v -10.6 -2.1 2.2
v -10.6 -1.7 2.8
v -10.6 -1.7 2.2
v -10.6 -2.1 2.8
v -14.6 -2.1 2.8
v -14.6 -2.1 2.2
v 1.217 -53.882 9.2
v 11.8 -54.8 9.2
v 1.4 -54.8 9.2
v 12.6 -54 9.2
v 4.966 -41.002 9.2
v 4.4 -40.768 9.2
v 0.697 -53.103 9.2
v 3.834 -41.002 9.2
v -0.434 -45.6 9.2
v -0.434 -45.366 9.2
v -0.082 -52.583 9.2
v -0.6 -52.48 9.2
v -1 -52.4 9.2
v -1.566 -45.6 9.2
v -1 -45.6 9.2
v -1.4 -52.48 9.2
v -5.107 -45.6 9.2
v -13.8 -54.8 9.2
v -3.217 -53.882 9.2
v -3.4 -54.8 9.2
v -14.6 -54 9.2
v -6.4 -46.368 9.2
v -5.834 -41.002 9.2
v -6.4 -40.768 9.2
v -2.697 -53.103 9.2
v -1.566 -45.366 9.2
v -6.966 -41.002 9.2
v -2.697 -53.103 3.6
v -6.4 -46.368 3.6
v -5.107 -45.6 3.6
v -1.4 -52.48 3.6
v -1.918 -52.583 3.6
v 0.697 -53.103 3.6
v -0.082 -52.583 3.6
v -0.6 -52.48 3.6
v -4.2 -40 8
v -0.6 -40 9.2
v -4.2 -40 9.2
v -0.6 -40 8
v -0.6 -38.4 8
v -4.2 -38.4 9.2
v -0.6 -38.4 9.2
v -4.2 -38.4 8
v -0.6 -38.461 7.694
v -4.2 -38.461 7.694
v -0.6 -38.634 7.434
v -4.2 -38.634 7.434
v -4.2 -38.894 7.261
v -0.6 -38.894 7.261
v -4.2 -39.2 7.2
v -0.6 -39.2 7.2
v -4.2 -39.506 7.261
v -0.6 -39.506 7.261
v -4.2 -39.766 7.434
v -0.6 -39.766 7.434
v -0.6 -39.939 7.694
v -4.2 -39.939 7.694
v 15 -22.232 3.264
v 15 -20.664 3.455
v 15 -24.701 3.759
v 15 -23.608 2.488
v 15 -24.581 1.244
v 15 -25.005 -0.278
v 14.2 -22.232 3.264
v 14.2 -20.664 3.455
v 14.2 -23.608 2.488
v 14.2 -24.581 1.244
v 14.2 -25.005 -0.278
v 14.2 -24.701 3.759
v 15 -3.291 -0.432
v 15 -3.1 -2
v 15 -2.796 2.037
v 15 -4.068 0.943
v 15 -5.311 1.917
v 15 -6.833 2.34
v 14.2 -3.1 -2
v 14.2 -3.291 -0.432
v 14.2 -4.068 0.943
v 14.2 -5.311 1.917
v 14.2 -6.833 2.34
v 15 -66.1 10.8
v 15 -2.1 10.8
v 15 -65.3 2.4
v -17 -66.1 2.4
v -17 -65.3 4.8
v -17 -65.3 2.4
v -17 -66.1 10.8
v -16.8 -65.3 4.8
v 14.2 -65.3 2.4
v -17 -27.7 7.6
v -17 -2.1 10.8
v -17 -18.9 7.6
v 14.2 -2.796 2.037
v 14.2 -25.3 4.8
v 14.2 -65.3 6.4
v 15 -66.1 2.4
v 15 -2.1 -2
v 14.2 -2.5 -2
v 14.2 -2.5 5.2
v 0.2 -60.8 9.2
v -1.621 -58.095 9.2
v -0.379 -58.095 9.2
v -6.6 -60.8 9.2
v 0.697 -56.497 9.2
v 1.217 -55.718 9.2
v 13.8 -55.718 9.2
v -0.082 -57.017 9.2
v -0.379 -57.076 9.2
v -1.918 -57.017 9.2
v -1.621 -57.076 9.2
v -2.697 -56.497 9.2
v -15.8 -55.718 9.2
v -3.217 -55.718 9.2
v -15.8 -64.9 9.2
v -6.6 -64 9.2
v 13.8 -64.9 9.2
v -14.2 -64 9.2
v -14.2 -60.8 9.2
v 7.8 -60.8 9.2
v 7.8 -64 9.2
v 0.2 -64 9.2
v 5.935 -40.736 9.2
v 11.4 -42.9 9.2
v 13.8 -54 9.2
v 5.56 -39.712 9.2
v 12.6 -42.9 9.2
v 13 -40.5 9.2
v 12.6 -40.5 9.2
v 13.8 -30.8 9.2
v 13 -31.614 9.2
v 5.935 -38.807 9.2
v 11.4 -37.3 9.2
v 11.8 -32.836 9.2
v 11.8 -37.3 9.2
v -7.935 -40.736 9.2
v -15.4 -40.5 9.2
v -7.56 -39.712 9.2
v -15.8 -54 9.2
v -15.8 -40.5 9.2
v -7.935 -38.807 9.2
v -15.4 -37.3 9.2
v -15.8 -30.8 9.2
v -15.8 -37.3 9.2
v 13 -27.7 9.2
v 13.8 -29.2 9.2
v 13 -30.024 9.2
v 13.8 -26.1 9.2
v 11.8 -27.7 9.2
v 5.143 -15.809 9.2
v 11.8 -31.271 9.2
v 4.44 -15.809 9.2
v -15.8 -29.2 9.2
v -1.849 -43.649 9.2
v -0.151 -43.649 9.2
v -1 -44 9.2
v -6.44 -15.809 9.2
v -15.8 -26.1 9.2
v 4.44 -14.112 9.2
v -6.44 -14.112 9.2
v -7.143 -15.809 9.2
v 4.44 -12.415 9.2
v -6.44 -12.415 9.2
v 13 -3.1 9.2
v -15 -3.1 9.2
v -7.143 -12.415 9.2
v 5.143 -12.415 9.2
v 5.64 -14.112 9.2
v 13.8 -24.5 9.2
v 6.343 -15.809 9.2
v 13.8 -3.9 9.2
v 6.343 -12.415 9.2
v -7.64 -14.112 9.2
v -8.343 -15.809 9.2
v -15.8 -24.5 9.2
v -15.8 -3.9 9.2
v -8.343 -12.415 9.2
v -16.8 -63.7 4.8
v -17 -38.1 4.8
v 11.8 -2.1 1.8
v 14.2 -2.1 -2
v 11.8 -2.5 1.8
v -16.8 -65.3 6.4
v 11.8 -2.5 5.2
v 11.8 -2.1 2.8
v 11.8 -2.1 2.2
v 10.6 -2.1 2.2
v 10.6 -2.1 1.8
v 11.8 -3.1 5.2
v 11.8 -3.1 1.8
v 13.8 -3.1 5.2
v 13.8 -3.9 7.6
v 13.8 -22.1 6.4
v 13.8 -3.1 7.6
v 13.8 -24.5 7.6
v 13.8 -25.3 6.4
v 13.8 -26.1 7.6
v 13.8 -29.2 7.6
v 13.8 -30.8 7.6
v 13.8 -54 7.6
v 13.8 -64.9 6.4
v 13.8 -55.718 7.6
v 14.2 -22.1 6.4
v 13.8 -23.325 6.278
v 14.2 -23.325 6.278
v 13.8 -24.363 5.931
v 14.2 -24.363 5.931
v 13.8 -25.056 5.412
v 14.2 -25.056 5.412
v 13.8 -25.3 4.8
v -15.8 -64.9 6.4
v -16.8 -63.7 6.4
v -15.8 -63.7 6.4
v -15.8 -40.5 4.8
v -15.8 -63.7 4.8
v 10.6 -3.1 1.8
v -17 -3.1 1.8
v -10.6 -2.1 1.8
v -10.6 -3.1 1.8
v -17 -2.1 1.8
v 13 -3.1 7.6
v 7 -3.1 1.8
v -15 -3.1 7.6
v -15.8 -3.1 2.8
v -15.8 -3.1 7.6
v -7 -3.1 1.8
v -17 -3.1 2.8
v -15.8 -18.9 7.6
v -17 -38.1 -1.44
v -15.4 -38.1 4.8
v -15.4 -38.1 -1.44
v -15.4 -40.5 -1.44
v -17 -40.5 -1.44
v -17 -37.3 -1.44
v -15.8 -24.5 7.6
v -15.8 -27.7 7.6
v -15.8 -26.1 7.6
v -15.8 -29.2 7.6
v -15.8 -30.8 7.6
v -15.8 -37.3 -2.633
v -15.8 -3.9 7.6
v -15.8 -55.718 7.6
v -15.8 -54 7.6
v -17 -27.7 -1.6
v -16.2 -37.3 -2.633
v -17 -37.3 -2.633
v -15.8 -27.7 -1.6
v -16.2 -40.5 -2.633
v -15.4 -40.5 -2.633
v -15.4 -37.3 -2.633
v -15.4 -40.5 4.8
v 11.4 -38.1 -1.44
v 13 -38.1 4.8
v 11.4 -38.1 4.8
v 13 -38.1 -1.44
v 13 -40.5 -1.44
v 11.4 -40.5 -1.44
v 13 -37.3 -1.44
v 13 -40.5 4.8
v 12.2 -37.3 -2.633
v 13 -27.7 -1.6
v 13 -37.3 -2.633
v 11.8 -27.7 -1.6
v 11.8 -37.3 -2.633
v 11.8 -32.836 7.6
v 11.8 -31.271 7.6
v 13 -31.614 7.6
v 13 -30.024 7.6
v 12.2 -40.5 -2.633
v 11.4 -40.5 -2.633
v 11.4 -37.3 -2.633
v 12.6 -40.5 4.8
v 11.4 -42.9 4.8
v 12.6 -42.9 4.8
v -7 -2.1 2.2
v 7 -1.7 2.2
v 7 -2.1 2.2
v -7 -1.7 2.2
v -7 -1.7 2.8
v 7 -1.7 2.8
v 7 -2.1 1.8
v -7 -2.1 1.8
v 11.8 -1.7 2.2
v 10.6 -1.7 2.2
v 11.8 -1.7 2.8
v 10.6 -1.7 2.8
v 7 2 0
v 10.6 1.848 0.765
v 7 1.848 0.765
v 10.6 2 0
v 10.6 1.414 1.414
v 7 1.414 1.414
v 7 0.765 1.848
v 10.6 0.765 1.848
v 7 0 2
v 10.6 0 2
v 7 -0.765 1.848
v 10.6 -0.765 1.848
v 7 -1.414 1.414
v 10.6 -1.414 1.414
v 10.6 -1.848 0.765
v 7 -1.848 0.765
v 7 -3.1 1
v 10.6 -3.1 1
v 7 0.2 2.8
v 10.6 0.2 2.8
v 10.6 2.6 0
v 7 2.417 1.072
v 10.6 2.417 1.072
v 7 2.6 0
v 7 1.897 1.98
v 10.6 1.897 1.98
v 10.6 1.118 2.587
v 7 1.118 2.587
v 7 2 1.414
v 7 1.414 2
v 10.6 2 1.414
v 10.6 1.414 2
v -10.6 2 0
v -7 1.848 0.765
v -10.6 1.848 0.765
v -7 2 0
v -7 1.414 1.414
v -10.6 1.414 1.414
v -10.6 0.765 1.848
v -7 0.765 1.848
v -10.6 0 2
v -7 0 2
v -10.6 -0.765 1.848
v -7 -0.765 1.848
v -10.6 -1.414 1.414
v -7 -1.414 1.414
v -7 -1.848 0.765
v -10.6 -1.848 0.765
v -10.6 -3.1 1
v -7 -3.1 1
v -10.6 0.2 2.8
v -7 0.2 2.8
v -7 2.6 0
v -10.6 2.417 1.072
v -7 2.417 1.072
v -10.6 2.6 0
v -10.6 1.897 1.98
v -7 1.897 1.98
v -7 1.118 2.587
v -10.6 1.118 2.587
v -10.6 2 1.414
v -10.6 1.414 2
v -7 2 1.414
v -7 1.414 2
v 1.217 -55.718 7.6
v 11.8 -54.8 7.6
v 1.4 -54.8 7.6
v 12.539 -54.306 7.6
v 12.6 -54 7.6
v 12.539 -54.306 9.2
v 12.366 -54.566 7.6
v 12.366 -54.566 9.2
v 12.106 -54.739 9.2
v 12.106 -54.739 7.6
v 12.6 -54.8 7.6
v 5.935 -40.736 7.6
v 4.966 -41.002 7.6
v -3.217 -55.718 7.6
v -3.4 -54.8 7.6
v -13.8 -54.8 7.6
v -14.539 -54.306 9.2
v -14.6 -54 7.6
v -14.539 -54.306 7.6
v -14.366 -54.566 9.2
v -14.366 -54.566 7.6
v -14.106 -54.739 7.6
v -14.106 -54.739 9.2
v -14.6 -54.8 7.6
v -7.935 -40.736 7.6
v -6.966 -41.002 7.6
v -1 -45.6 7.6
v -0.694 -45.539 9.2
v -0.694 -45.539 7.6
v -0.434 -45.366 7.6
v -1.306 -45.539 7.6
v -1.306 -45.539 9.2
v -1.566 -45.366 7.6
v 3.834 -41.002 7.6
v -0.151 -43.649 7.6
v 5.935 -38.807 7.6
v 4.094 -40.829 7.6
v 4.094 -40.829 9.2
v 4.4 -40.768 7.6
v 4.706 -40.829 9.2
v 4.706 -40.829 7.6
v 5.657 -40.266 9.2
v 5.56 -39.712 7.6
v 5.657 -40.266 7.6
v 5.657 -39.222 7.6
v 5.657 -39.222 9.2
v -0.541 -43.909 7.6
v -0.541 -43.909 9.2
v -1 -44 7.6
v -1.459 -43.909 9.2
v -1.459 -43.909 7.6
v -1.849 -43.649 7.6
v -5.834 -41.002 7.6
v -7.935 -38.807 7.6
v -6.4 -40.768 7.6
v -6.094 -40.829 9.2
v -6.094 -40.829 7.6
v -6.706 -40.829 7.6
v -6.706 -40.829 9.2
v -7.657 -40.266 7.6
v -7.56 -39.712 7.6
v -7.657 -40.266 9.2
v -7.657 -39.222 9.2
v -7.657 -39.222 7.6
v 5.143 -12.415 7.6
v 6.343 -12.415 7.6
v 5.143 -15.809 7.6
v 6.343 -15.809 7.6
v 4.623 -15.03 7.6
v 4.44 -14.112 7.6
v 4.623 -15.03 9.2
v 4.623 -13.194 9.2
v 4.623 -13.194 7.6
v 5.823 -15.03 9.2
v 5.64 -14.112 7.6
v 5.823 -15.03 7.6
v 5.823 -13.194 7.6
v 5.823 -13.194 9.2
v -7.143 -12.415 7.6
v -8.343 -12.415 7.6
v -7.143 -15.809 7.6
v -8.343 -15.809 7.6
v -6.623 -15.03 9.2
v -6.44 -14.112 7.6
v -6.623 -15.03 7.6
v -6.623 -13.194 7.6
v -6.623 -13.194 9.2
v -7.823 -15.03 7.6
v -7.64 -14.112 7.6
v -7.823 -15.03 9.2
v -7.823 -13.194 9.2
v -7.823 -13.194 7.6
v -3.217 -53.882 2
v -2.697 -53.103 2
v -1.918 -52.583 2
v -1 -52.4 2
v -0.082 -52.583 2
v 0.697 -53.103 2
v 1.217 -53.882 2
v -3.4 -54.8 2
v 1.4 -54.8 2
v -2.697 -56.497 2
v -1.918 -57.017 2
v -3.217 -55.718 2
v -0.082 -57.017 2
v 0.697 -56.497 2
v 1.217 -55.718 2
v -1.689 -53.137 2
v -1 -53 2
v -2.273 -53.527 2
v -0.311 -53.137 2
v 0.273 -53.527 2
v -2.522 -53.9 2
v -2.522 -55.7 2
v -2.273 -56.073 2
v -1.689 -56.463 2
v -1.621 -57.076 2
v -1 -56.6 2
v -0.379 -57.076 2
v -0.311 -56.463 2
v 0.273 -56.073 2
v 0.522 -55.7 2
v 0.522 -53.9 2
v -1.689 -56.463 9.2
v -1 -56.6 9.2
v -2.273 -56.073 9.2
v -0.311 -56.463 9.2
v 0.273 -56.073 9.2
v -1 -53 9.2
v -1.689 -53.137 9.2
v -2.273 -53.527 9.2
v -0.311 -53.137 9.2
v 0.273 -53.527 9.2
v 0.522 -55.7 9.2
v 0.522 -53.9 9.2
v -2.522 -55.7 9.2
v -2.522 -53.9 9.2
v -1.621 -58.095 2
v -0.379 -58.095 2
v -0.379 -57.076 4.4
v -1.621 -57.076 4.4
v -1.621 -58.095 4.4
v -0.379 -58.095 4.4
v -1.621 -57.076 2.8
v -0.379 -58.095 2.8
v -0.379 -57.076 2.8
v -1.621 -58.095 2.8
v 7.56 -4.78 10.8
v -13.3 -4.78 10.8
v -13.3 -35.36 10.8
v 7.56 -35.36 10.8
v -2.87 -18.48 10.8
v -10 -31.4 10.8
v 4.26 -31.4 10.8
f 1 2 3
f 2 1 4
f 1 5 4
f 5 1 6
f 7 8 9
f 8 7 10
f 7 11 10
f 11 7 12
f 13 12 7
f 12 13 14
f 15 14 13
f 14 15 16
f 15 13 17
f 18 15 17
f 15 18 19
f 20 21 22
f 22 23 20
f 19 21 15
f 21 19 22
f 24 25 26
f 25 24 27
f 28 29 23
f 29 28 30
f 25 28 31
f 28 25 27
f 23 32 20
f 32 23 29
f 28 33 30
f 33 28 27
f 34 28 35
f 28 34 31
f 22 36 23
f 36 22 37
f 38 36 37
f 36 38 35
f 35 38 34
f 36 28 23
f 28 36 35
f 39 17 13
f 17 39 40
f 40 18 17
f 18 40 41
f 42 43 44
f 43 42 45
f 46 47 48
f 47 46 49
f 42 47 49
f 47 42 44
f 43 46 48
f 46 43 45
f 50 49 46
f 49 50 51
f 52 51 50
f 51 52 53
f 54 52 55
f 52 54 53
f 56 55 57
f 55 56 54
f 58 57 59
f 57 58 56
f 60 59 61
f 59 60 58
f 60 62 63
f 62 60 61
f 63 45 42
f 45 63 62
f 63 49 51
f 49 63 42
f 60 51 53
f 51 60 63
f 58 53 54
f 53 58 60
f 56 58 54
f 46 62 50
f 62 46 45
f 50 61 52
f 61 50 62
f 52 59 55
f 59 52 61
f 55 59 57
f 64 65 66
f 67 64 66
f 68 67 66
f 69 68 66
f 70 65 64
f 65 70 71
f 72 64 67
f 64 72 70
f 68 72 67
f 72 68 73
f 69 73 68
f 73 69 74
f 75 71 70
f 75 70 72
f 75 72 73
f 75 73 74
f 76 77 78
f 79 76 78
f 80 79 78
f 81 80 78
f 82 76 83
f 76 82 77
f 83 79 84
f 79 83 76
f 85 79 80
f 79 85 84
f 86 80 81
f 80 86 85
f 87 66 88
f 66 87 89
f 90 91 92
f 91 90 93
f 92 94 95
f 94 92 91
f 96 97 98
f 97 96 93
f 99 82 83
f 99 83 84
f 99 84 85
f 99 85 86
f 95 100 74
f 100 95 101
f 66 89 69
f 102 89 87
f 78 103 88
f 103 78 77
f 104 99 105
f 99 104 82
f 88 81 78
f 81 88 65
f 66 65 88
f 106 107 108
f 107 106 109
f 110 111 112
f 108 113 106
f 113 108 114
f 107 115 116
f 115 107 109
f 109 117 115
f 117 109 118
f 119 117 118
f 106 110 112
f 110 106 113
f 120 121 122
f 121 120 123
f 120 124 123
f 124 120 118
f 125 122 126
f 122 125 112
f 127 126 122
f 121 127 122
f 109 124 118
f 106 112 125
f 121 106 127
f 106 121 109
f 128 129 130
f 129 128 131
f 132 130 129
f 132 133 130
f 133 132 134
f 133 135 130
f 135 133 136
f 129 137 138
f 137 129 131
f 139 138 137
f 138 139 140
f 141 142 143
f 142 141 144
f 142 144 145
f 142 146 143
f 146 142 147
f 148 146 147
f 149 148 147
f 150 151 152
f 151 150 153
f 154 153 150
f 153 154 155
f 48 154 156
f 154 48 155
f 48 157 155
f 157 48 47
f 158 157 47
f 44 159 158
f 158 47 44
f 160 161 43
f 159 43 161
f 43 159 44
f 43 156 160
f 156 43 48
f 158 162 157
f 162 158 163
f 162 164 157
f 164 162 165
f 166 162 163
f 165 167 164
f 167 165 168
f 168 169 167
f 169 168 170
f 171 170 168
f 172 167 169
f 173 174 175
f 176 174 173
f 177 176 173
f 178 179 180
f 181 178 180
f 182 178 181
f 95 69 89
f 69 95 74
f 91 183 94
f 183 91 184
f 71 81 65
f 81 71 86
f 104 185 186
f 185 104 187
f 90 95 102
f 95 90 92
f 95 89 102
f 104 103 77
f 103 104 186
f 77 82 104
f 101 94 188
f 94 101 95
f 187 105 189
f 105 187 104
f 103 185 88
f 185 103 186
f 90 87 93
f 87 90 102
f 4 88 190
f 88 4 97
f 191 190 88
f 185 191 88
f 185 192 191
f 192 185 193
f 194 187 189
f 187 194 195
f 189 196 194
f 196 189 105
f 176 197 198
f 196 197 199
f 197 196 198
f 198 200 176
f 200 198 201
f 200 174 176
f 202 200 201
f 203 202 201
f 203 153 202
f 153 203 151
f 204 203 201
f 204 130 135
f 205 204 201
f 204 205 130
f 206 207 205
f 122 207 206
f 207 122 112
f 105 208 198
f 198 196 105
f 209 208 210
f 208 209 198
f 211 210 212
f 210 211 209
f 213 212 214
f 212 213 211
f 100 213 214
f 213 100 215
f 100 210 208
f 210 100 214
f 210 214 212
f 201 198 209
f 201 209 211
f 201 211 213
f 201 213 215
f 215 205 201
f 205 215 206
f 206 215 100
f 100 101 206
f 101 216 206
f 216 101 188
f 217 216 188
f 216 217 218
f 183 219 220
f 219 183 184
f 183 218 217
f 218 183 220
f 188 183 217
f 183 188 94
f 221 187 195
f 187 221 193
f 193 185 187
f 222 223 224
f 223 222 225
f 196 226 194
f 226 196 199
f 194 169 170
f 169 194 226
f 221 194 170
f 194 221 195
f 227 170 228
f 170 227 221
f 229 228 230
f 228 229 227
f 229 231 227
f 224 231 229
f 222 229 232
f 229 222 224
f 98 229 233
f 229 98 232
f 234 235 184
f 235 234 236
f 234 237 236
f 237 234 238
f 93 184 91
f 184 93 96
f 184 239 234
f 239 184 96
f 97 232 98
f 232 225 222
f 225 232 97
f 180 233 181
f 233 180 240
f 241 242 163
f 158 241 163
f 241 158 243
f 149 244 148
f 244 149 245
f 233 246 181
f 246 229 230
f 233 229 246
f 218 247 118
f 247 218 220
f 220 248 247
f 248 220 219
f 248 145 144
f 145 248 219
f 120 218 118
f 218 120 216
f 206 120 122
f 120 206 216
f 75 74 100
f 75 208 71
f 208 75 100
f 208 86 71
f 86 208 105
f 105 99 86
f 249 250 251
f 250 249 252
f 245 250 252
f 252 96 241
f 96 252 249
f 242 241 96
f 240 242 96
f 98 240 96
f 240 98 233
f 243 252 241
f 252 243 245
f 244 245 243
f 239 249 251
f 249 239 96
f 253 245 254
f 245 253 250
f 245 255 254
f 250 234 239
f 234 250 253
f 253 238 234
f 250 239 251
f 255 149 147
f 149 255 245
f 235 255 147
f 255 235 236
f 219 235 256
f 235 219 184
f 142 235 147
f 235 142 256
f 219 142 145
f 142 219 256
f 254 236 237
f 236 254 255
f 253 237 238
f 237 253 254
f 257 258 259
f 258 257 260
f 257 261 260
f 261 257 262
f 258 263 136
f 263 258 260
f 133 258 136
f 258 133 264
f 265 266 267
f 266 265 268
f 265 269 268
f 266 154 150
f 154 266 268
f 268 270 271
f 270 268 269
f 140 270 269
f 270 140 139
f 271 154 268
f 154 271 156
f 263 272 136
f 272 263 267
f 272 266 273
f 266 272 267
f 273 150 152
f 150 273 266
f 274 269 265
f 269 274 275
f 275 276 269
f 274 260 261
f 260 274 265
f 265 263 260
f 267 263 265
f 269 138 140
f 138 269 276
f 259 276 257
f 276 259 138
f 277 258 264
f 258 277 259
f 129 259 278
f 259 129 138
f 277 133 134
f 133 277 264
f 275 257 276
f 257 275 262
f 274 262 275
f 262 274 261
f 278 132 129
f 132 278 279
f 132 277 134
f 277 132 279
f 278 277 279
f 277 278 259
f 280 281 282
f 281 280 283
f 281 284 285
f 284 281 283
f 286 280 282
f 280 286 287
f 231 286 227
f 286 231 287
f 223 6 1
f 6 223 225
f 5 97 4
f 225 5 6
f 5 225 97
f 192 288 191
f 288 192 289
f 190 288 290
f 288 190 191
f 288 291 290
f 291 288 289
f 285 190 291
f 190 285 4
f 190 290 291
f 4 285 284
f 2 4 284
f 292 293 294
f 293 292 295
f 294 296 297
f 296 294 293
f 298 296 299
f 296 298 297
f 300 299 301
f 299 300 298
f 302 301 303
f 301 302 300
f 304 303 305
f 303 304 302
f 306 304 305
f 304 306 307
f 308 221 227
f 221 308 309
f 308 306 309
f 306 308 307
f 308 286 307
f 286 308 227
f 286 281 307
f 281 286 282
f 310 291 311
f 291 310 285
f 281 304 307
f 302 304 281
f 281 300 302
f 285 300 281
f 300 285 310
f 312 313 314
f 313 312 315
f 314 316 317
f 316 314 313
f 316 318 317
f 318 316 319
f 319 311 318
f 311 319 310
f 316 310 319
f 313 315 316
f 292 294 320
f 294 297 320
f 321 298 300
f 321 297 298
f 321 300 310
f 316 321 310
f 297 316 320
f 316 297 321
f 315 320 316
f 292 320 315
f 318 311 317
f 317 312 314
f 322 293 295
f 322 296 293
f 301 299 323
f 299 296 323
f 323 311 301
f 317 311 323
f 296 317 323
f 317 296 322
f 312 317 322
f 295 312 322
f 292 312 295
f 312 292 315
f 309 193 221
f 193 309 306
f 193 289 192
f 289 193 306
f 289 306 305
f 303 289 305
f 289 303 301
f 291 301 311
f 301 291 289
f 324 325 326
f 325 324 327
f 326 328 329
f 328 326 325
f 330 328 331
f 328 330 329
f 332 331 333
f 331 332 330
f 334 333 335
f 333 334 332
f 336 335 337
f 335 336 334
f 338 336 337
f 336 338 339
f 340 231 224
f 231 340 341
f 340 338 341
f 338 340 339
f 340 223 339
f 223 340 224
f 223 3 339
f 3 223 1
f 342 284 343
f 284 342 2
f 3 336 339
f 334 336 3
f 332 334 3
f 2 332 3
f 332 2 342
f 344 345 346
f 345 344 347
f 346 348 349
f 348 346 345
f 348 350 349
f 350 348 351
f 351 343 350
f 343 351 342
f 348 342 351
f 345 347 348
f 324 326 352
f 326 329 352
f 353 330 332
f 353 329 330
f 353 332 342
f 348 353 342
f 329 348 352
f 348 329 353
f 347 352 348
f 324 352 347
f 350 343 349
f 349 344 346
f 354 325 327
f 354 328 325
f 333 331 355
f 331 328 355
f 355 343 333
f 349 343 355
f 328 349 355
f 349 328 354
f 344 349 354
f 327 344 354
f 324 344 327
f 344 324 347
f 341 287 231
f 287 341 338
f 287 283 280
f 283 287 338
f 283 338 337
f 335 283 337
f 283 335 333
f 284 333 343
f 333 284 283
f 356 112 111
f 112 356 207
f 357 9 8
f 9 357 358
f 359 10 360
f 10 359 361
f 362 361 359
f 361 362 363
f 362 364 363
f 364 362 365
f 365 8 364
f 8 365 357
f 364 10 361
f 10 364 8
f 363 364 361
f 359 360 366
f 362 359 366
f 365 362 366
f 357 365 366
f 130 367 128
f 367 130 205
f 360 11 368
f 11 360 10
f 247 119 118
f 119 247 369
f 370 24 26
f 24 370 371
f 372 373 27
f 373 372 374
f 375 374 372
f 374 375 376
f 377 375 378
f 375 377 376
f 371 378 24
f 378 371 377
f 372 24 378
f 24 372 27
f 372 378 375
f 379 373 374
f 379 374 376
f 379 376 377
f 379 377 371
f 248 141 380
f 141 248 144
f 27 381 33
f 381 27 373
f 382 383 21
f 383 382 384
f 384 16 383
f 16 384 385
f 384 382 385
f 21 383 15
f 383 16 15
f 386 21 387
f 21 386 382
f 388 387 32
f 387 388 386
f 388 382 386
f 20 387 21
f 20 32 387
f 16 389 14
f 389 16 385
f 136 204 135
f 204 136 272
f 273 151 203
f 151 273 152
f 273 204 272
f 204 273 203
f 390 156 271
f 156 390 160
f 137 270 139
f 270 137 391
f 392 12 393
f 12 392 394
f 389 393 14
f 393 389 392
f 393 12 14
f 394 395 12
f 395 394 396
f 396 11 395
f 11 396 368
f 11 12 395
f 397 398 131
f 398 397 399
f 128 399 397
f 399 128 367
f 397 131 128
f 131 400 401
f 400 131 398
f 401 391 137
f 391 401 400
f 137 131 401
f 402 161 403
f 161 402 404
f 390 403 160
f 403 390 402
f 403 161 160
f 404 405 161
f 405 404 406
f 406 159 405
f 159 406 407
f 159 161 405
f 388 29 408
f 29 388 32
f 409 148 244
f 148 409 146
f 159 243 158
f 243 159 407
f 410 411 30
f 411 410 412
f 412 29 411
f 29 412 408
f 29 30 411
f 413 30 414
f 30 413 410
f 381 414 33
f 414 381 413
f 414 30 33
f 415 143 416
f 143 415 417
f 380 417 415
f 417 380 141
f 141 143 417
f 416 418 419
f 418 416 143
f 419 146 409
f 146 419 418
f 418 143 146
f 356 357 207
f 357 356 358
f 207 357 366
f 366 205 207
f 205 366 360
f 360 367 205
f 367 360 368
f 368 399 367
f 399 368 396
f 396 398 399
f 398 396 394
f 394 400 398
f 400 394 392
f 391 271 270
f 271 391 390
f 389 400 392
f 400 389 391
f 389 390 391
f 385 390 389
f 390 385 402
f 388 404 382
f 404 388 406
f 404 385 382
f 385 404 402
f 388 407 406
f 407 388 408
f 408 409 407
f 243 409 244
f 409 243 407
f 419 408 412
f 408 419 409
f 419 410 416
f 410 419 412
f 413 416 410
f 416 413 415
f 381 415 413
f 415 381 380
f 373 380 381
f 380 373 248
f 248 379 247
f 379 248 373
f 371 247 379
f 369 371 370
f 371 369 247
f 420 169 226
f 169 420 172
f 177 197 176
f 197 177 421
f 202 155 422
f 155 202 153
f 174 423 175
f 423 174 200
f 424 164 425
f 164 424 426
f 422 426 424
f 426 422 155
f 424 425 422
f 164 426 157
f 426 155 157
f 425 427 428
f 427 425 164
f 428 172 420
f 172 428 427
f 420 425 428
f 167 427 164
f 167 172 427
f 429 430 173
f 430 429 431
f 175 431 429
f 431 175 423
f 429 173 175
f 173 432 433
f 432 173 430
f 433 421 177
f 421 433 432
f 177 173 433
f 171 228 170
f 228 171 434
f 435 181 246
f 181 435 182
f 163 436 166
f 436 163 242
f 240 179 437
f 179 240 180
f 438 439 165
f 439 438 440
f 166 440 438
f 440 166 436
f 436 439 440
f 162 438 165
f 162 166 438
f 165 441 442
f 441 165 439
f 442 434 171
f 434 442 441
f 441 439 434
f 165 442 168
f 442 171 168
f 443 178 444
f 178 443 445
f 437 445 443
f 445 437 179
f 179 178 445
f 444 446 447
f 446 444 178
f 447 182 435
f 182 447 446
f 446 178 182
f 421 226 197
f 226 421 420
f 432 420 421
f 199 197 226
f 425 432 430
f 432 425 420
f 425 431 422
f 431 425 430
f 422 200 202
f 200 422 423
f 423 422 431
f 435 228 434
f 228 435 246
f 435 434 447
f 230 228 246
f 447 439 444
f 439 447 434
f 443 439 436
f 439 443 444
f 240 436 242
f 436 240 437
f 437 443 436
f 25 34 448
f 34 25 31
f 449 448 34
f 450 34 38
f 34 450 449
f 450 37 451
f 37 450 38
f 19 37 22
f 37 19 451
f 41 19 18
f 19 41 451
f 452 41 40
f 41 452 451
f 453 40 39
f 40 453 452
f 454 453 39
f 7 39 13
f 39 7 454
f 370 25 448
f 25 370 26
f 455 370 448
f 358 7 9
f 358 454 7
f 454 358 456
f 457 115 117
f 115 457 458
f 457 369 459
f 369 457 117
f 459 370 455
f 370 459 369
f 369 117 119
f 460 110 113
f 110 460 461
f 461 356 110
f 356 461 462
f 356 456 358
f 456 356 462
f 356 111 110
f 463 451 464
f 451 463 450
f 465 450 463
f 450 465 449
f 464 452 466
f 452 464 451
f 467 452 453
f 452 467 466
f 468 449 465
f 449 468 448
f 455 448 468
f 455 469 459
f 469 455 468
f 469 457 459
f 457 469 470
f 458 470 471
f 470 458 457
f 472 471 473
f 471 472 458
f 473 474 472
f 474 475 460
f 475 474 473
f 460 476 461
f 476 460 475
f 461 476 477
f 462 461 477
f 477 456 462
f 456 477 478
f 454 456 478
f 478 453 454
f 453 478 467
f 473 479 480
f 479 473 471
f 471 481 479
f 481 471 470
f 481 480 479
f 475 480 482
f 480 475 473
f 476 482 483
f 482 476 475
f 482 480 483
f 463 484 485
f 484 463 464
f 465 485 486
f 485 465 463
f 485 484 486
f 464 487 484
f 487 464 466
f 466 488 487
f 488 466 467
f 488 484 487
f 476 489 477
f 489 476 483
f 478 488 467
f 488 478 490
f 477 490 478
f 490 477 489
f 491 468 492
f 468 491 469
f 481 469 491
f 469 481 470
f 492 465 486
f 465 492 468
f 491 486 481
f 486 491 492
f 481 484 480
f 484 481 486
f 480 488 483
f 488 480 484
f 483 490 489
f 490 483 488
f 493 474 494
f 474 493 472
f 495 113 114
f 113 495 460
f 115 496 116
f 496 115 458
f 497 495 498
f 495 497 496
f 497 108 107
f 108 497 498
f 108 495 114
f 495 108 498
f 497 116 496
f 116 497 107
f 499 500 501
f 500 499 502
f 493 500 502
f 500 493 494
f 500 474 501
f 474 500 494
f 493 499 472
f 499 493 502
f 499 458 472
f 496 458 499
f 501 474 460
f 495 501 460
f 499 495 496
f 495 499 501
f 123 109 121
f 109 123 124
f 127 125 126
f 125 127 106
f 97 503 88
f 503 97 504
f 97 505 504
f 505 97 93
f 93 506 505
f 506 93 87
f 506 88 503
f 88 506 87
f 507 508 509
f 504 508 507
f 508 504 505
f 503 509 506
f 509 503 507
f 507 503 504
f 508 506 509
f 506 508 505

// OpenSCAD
use <../lib.scad>
use <s/4111s01.scad>
use <s/4112s01.scad>
function ldraw_lib__4111p04() = [
// 0 ~Electric Switch: Key Right with Yellow Triangle Up Pattern
// 0 Name: 4111p04.dat
// 0 Author: Javier Orquera [kuramapika1]
// 0 !LDRAW_ORG Part UPDATE 2025-09
// 0 !LICENSE Licensed under CC BY 4.0 : see CAreadme.txt
// 
// 0 !HELP to put this part into a pressed-down state, rotate it 4.3 degrees
// 0 !HELP around the x-axis
// 
// 0 BFC CERTIFY CCW
  [0,"BFC","CERTIFY"],
  [0,"BFC","CCW"],
// 
// 0 !KEYWORDS set 7862, switch, Train
// 
// 0 !HISTORY 2025-04-24 [kuramapika1] Adapted surfaces
// 0 !HISTORY 2025-09-11 [kuramapika1] Use of new subfile
// 0 !HISTORY 2025-09-29 [OrionP] Official Update 2025-09
// 
// 1 16 0 0 0 1 0 0 0 1 0 0 0 1 s\4111s01.dat
  [1,16,0,0,0,1,0,0,0,1,0,0,0,1, ldraw_lib__s__4111s01()],
// 1 16 0 0 0 -1 0 0 0 1 0 0 0 1 s\4112s01.dat
  [1,16,0,0,0,-1,0,0,0,1,0,0,0,1, ldraw_lib__s__4112s01()],
// 4 16 -42.5 -27 -5.25 -33.25 -27 -11.95 18.9 -27 -11.95 37.5 -27 -5.25
  [4,16,-42.5,-27,-5.25,-33.25,-27,-11.95,18.9,-27,-11.95,37.5,-27,-5.25],
// 4 16 -33.25 -27 -88.4 -33.25 -27 -11.95 -42.5 -27 -5.25 -42.5 -27 -165.25
  [4,16,-33.25,-27,-88.4,-33.25,-27,-11.95,-42.5,-27,-5.25,-42.5,-27,-165.25],
// 4 16 -33.25 -27 -88.4 -42.5 -27 -165.25 37.5 -27 -165.25 18.9 -27 -88.4
  [4,16,-33.25,-27,-88.4,-42.5,-27,-165.25,37.5,-27,-165.25,18.9,-27,-88.4],
// 4 16 37.5 -27 -165.25 37.5 -27 -5.25 18.9 -27 -11.95 18.9 -27 -88.4
  [4,16,37.5,-27,-165.25,37.5,-27,-5.25,18.9,-27,-11.95,18.9,-27,-88.4],
// 3 14 -7.175 -27 -46.2 -25 -27 -78.5 10.65 -27 -78.5
  [3,14,-7.175,-27,-46.2,-25,-27,-78.5,10.65,-27,-78.5],
// 4 0 -33.25 -27 -88.4 -25 -27 -78.5 -7.175 -27 -46.2 -33.25 -27 -11.95
  [4,0,-33.25,-27,-88.4,-25,-27,-78.5,-7.175,-27,-46.2,-33.25,-27,-11.95],
// 4 0 10.65 -27 -78.5 18.9 -27 -88.4 18.9 -27 -11.95 -7.175 -27 -46.2
  [4,0,10.65,-27,-78.5,18.9,-27,-88.4,18.9,-27,-11.95,-7.175,-27,-46.2],
// 3 0 -7.175 -27 -46.2 18.9 -27 -11.95 -33.25 -27 -11.95
  [3,0,-7.175,-27,-46.2,18.9,-27,-11.95,-33.25,-27,-11.95],
// 4 0 -33.25 -27 -88.4 18.9 -27 -88.4 10.65 -27 -78.5 -25 -27 -78.5
  [4,0,-33.25,-27,-88.4,18.9,-27,-88.4,10.65,-27,-78.5,-25,-27,-78.5],
];
module ldraw_lib__4111p04(step=0, col=false, unit=2/5, alt=false, line=0.2, solid=!$preview)
    makepoly(ldraw_lib__4111p04(), step=step, col=col, unit=unit, alt=alt, line=line, solid=solid);
ldraw_lib__4111p04(line=0.2);
